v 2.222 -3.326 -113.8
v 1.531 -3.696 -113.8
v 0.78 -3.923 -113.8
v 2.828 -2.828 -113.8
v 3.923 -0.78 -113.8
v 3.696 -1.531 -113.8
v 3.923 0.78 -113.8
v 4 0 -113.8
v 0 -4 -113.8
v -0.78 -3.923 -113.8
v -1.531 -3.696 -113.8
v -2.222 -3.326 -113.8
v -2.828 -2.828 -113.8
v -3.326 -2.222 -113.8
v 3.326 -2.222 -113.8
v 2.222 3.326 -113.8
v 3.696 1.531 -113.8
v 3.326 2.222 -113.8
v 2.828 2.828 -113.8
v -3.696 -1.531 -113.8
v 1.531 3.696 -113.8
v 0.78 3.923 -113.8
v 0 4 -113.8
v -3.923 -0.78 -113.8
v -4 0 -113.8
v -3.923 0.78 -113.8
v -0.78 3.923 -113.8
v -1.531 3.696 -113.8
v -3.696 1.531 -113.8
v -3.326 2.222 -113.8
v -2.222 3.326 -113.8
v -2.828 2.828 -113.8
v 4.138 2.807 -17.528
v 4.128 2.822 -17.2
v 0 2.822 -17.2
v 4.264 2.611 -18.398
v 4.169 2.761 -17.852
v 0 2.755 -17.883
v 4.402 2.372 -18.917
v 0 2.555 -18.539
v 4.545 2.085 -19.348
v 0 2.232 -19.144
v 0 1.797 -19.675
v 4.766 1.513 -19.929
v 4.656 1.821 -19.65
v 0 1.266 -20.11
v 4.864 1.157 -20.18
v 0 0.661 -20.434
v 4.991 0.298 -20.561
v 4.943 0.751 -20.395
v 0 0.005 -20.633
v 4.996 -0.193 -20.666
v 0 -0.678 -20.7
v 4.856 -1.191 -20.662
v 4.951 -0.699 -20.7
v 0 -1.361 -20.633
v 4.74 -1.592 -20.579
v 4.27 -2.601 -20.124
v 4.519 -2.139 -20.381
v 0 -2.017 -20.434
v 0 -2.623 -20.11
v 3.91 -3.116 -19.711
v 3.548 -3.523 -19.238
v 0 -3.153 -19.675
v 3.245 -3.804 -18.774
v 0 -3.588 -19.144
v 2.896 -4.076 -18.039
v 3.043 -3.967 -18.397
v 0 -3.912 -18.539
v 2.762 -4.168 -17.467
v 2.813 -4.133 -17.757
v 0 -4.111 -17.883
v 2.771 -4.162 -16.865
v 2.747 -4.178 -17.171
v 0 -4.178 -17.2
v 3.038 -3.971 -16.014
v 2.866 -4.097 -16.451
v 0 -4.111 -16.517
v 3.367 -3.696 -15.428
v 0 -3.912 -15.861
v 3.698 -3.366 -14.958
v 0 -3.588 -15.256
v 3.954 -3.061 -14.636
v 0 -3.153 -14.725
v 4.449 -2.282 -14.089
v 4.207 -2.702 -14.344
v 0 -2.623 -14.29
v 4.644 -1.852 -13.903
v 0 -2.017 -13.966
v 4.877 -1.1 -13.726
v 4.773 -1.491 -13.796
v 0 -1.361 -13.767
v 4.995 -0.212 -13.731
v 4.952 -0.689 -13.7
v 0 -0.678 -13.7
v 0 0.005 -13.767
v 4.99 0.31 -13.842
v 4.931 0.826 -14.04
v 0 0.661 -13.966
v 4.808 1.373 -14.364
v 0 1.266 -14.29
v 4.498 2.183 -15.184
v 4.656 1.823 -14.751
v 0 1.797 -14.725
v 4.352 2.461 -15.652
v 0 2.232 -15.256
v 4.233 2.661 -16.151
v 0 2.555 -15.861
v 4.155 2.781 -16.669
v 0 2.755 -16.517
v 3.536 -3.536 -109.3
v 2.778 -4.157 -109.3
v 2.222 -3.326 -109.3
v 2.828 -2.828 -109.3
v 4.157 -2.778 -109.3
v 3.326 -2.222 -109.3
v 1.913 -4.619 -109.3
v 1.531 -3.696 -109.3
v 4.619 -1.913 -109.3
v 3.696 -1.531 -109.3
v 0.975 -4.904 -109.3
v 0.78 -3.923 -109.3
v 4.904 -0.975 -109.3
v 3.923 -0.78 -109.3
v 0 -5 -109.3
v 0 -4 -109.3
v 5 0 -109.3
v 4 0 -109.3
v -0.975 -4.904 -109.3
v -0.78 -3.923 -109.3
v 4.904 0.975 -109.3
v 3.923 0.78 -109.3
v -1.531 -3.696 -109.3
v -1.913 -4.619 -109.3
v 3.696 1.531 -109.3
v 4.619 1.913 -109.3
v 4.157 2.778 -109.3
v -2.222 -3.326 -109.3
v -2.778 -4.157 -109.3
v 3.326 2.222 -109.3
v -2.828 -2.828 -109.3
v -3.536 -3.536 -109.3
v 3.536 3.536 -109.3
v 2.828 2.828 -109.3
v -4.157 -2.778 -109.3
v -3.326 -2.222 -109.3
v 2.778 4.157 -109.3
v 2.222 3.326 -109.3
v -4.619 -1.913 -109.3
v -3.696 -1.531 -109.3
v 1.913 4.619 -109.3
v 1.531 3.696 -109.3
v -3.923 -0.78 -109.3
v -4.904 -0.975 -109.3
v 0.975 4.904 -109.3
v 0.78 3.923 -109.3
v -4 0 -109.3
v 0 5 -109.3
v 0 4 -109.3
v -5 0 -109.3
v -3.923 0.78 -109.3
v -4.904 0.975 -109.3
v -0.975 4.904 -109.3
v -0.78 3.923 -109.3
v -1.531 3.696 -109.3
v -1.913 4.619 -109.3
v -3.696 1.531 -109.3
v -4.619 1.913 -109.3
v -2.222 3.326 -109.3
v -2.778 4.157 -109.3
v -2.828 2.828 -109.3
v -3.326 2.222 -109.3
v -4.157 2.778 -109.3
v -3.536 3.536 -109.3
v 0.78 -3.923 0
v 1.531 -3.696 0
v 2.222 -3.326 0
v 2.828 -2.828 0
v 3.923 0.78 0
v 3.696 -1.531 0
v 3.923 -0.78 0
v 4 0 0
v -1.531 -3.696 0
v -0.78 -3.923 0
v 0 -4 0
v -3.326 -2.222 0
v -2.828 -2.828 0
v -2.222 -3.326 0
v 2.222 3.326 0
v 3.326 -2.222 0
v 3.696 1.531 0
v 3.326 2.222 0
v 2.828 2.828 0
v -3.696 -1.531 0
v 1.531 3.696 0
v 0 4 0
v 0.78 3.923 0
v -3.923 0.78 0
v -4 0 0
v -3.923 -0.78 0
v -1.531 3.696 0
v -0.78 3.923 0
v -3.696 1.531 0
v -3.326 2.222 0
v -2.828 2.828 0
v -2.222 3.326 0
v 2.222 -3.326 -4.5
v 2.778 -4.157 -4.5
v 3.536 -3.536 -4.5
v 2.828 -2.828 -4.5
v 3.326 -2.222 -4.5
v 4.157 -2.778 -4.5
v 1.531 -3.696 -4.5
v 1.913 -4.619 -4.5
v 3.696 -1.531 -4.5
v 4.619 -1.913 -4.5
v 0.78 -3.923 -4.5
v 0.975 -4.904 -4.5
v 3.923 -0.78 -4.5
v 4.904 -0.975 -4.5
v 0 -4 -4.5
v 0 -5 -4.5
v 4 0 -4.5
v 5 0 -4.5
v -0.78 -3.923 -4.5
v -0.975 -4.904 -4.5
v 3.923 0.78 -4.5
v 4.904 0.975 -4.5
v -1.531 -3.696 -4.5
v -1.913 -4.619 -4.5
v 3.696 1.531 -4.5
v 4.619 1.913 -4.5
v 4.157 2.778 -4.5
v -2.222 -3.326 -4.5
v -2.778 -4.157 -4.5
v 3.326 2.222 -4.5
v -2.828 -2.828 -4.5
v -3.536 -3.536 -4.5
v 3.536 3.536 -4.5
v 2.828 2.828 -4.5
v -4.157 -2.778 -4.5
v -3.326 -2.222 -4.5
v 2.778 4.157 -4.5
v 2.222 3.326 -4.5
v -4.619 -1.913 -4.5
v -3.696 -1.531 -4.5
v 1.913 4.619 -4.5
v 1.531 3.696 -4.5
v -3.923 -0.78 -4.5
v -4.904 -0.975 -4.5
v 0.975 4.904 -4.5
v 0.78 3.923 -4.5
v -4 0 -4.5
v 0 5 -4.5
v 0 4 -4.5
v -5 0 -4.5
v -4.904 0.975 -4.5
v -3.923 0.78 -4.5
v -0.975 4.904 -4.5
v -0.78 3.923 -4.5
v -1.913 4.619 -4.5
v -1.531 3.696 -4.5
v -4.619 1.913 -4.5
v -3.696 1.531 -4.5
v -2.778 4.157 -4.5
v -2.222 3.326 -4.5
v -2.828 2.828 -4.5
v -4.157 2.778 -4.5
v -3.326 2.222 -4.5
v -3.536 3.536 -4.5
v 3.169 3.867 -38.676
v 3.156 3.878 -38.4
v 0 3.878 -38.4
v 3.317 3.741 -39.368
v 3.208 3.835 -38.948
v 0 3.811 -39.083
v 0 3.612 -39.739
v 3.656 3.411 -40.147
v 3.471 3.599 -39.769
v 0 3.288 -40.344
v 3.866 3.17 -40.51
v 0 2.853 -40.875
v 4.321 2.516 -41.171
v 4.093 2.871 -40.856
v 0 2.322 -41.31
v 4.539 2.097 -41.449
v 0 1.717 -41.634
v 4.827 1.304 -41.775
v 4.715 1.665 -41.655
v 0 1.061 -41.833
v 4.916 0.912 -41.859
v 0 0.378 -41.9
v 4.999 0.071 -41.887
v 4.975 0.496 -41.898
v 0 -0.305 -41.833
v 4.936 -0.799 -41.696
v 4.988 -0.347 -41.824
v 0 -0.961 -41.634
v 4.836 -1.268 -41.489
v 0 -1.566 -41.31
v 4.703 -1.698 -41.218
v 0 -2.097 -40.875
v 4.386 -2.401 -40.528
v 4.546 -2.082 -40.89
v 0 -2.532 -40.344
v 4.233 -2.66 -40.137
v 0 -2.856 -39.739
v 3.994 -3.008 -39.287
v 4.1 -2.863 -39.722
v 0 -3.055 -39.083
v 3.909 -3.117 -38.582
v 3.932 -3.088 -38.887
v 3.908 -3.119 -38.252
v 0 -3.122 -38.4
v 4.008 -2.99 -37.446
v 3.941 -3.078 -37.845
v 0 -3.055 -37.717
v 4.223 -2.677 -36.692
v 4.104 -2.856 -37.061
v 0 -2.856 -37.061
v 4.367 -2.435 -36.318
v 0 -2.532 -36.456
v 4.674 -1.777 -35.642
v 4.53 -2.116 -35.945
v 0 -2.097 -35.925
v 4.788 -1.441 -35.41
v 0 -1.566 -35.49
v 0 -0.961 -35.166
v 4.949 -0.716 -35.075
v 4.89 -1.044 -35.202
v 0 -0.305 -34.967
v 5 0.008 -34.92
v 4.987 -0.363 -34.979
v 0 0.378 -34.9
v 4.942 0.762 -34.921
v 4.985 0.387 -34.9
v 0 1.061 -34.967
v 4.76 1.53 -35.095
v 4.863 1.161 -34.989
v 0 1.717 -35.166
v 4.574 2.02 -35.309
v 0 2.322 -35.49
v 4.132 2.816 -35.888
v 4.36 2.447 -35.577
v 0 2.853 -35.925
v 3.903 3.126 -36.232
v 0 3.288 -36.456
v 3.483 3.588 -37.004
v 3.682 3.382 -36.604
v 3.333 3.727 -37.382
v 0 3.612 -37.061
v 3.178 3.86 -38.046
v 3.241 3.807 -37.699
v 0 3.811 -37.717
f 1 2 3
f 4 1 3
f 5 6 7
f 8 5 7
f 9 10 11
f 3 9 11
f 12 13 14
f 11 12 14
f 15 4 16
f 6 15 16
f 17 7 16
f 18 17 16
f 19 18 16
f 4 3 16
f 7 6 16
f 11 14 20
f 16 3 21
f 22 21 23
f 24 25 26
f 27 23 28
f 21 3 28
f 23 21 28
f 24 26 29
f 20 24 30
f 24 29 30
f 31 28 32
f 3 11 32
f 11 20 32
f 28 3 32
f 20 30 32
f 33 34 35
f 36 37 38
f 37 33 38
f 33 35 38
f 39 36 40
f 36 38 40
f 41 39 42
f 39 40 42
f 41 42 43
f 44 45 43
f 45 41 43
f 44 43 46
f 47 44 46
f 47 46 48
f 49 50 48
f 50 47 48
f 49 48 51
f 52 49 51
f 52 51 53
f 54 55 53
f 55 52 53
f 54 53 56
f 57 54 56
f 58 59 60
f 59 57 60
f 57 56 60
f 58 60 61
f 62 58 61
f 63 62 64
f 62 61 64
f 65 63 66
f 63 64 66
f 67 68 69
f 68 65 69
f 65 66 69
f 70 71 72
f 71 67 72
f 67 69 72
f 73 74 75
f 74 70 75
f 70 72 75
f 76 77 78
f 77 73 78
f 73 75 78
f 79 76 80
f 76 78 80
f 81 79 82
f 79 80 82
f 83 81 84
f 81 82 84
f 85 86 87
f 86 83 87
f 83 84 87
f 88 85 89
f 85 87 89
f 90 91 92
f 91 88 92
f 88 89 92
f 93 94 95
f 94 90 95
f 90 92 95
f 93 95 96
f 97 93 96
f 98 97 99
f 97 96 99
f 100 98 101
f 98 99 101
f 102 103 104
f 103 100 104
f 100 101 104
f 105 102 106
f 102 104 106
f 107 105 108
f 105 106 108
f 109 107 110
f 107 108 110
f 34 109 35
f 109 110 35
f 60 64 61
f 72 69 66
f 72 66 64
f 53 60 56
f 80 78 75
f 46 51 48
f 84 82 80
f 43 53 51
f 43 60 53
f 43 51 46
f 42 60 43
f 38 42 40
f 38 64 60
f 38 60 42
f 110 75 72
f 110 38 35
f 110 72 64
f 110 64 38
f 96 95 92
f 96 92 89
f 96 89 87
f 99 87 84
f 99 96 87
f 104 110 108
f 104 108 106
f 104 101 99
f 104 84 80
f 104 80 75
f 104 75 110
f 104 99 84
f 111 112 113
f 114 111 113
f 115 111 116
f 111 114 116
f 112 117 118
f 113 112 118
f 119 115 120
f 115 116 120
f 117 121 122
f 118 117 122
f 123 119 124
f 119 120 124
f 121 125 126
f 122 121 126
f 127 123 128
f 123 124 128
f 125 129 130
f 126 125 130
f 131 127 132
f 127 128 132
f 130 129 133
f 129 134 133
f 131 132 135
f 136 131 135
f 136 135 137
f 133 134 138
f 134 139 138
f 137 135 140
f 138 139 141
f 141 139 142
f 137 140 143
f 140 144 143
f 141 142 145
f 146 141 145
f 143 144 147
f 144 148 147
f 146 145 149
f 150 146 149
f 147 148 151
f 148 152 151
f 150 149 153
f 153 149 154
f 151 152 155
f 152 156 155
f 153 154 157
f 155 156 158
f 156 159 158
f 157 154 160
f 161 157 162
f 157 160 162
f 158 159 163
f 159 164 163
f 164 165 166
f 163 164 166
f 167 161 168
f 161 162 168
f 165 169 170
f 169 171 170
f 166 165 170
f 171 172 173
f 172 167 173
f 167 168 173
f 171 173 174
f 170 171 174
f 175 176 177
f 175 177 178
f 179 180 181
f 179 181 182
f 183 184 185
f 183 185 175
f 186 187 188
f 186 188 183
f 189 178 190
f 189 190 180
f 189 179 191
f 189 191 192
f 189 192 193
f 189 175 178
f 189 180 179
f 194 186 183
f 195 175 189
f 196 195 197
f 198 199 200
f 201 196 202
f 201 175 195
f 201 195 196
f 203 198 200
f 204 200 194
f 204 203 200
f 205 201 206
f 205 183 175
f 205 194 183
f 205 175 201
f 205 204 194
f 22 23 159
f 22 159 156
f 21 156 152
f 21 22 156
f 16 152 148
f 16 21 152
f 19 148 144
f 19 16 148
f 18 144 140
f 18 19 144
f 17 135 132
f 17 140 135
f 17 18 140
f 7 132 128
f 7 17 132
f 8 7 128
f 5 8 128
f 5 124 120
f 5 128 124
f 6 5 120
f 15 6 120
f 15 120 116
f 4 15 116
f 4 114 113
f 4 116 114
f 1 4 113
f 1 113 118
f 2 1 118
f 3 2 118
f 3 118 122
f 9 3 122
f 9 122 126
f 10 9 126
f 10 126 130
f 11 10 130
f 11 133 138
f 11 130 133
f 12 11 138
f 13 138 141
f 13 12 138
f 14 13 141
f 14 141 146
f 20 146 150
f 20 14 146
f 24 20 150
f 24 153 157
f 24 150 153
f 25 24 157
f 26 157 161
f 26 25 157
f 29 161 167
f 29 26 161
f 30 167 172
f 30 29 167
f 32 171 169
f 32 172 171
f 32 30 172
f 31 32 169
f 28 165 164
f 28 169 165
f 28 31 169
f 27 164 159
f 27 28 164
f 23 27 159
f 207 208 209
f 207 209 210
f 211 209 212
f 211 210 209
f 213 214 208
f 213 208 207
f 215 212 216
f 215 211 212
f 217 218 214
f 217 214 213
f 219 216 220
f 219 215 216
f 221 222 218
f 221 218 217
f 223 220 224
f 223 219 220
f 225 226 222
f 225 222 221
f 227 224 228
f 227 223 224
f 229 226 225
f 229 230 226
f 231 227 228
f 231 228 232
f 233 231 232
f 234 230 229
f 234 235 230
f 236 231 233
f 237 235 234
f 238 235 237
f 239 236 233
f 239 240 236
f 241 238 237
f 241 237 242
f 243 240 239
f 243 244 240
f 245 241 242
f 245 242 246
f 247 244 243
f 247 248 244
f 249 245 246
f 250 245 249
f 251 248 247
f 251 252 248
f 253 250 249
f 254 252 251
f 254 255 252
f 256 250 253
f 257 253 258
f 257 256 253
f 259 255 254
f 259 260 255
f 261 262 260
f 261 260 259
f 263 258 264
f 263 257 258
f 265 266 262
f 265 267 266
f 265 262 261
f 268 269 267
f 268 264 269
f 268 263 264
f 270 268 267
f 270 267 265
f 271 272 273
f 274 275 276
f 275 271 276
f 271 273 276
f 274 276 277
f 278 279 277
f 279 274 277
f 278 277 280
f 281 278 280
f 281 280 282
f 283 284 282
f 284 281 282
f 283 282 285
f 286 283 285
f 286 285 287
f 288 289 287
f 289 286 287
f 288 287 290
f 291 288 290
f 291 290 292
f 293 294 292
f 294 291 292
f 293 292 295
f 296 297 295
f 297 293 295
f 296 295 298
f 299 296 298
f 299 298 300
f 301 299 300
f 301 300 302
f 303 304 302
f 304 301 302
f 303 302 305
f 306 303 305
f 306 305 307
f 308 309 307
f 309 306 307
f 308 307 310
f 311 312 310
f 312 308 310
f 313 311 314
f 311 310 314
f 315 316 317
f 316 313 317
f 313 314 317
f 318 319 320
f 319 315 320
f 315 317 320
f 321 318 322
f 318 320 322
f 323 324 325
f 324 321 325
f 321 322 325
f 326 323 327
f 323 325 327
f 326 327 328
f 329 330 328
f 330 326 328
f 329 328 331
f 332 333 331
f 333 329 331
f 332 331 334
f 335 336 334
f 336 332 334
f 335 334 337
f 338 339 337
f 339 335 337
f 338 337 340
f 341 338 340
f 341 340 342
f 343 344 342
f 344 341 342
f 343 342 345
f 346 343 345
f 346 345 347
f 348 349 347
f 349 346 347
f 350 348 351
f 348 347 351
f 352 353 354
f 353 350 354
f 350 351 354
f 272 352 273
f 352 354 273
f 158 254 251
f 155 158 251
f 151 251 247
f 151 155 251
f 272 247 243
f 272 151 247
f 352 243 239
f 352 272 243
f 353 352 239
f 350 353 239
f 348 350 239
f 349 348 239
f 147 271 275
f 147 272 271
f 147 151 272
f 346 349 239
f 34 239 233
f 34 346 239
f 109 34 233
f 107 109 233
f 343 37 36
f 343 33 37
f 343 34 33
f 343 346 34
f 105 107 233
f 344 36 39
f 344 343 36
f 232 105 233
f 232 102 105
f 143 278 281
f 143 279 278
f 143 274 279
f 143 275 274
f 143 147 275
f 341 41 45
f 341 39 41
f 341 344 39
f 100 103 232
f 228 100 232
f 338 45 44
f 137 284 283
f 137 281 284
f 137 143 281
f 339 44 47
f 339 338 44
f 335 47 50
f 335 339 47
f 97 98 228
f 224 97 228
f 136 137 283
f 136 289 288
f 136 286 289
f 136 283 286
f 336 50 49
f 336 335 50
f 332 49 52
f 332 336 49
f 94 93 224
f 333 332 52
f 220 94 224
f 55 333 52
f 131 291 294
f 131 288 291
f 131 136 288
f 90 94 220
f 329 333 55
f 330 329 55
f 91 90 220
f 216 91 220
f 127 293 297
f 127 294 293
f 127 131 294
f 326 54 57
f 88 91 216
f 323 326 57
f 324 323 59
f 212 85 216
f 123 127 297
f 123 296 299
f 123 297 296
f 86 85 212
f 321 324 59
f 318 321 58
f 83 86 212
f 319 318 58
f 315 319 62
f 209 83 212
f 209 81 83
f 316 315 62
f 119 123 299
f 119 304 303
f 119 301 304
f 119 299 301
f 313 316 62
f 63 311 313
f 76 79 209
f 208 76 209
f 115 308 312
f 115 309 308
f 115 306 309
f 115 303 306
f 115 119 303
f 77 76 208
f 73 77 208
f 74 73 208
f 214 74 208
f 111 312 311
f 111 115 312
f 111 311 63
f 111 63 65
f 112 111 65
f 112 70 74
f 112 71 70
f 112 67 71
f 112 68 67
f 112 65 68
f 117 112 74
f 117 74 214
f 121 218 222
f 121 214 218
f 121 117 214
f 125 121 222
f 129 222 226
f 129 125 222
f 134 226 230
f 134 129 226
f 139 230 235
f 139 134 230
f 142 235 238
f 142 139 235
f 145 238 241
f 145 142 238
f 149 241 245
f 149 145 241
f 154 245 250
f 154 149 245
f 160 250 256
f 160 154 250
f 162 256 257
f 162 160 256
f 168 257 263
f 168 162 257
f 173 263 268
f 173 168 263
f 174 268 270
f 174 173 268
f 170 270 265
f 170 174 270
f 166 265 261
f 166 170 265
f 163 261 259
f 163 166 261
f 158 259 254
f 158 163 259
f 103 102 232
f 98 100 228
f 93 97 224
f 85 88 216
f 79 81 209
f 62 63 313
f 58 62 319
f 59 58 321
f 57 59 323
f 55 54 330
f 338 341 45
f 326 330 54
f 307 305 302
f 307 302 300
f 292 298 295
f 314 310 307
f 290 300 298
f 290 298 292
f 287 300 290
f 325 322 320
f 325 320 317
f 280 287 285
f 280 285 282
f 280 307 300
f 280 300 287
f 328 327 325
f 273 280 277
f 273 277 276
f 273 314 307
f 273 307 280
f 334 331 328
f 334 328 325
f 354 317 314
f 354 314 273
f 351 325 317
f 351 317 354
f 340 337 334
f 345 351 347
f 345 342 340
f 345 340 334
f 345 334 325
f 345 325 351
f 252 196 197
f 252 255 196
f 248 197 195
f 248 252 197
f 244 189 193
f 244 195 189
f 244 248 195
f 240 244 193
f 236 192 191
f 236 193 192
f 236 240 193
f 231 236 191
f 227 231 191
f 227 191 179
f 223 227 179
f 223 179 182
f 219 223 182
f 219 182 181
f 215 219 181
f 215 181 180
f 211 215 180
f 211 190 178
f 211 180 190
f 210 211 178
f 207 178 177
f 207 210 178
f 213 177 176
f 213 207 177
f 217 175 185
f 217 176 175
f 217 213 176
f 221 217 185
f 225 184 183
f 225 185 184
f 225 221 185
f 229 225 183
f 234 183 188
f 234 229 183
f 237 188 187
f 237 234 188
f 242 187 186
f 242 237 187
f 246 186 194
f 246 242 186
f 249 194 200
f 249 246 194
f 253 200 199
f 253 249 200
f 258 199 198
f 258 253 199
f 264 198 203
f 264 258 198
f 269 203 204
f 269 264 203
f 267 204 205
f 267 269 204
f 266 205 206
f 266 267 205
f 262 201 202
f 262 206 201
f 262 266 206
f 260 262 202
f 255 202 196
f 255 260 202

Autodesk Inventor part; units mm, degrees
ref_plane "YZ Plane" through (0, 0, 0) normal (1, 0, 0) x (0, 1, 0)
ref_plane "XZ Plane" through (0, 0, 0) normal (0, 1, 0) x (-1, 0, 0)
ref_plane "XY Plane" through (0, 0, 0) normal (0, 0, 1) x (1, 0, 0)
sketch "Sketch1" plane through (0, 0, 0) normal (1, 0, 0) x (0, 1, 0)
  line L0 (0, 0) -> (4, 0)
  line L1 (4, 0) -> (4, -4.5)
  line L2 (4, -4.5) -> (5, -4.5)
  line L3 (5, -4.5) -> (5, -109.3)
  line L4 (5, -109.3) -> (4, -109.3)
  line L5 (4, -109.3) -> (4, -113.8)
  line L6 (4, -113.8) -> (0, -113.8)
  line L7 (0, -113.8) -> (0, 0)
  dimension "d0" = 4.5
  dimension "d1" = 113.8
  dimension "d2" = 5
  dimension "d3" = 4
  dimension "d4" = 4
  dimension "d5" = 4.5
revolve "Revolution1" add sketch "Sketch1" angle 360 about axis through (0, 0, -113.8) along (0, 0, 1)
sketch "Sketch2" plane through (0, 0, 0) normal (1, 0, 0) x (0, 1, 0)
  circle A0 centre (-0.6781, -17.2) radius 3.5
  line L0 (-4, 0) -> (4, 0) projected
  point P0 (0, 0)
  dimension "d7" = 7
  dimension "d8" = 17.2
extrude "Extrusion1" cut sketch "Sketch2" along normal through all
sketch "Sketch3" plane through (0, 0, 0) normal (1, 0, 0) x (0, 1, 0)
  circle A0 centre (0.378, -38.4) radius 3.5
  line L0 (-4, -113.8) -> (4, -113.8) projected
  point P0 (0, 0)
  dimension "d11" = 7
  dimension "d12" = 75.4
extrude "Extrusion2" cut sketch "Sketch3" along normal through all
equation "\"d5\" = d0"
properties part number "Mecanum Axle" material "Stainless Steel"
